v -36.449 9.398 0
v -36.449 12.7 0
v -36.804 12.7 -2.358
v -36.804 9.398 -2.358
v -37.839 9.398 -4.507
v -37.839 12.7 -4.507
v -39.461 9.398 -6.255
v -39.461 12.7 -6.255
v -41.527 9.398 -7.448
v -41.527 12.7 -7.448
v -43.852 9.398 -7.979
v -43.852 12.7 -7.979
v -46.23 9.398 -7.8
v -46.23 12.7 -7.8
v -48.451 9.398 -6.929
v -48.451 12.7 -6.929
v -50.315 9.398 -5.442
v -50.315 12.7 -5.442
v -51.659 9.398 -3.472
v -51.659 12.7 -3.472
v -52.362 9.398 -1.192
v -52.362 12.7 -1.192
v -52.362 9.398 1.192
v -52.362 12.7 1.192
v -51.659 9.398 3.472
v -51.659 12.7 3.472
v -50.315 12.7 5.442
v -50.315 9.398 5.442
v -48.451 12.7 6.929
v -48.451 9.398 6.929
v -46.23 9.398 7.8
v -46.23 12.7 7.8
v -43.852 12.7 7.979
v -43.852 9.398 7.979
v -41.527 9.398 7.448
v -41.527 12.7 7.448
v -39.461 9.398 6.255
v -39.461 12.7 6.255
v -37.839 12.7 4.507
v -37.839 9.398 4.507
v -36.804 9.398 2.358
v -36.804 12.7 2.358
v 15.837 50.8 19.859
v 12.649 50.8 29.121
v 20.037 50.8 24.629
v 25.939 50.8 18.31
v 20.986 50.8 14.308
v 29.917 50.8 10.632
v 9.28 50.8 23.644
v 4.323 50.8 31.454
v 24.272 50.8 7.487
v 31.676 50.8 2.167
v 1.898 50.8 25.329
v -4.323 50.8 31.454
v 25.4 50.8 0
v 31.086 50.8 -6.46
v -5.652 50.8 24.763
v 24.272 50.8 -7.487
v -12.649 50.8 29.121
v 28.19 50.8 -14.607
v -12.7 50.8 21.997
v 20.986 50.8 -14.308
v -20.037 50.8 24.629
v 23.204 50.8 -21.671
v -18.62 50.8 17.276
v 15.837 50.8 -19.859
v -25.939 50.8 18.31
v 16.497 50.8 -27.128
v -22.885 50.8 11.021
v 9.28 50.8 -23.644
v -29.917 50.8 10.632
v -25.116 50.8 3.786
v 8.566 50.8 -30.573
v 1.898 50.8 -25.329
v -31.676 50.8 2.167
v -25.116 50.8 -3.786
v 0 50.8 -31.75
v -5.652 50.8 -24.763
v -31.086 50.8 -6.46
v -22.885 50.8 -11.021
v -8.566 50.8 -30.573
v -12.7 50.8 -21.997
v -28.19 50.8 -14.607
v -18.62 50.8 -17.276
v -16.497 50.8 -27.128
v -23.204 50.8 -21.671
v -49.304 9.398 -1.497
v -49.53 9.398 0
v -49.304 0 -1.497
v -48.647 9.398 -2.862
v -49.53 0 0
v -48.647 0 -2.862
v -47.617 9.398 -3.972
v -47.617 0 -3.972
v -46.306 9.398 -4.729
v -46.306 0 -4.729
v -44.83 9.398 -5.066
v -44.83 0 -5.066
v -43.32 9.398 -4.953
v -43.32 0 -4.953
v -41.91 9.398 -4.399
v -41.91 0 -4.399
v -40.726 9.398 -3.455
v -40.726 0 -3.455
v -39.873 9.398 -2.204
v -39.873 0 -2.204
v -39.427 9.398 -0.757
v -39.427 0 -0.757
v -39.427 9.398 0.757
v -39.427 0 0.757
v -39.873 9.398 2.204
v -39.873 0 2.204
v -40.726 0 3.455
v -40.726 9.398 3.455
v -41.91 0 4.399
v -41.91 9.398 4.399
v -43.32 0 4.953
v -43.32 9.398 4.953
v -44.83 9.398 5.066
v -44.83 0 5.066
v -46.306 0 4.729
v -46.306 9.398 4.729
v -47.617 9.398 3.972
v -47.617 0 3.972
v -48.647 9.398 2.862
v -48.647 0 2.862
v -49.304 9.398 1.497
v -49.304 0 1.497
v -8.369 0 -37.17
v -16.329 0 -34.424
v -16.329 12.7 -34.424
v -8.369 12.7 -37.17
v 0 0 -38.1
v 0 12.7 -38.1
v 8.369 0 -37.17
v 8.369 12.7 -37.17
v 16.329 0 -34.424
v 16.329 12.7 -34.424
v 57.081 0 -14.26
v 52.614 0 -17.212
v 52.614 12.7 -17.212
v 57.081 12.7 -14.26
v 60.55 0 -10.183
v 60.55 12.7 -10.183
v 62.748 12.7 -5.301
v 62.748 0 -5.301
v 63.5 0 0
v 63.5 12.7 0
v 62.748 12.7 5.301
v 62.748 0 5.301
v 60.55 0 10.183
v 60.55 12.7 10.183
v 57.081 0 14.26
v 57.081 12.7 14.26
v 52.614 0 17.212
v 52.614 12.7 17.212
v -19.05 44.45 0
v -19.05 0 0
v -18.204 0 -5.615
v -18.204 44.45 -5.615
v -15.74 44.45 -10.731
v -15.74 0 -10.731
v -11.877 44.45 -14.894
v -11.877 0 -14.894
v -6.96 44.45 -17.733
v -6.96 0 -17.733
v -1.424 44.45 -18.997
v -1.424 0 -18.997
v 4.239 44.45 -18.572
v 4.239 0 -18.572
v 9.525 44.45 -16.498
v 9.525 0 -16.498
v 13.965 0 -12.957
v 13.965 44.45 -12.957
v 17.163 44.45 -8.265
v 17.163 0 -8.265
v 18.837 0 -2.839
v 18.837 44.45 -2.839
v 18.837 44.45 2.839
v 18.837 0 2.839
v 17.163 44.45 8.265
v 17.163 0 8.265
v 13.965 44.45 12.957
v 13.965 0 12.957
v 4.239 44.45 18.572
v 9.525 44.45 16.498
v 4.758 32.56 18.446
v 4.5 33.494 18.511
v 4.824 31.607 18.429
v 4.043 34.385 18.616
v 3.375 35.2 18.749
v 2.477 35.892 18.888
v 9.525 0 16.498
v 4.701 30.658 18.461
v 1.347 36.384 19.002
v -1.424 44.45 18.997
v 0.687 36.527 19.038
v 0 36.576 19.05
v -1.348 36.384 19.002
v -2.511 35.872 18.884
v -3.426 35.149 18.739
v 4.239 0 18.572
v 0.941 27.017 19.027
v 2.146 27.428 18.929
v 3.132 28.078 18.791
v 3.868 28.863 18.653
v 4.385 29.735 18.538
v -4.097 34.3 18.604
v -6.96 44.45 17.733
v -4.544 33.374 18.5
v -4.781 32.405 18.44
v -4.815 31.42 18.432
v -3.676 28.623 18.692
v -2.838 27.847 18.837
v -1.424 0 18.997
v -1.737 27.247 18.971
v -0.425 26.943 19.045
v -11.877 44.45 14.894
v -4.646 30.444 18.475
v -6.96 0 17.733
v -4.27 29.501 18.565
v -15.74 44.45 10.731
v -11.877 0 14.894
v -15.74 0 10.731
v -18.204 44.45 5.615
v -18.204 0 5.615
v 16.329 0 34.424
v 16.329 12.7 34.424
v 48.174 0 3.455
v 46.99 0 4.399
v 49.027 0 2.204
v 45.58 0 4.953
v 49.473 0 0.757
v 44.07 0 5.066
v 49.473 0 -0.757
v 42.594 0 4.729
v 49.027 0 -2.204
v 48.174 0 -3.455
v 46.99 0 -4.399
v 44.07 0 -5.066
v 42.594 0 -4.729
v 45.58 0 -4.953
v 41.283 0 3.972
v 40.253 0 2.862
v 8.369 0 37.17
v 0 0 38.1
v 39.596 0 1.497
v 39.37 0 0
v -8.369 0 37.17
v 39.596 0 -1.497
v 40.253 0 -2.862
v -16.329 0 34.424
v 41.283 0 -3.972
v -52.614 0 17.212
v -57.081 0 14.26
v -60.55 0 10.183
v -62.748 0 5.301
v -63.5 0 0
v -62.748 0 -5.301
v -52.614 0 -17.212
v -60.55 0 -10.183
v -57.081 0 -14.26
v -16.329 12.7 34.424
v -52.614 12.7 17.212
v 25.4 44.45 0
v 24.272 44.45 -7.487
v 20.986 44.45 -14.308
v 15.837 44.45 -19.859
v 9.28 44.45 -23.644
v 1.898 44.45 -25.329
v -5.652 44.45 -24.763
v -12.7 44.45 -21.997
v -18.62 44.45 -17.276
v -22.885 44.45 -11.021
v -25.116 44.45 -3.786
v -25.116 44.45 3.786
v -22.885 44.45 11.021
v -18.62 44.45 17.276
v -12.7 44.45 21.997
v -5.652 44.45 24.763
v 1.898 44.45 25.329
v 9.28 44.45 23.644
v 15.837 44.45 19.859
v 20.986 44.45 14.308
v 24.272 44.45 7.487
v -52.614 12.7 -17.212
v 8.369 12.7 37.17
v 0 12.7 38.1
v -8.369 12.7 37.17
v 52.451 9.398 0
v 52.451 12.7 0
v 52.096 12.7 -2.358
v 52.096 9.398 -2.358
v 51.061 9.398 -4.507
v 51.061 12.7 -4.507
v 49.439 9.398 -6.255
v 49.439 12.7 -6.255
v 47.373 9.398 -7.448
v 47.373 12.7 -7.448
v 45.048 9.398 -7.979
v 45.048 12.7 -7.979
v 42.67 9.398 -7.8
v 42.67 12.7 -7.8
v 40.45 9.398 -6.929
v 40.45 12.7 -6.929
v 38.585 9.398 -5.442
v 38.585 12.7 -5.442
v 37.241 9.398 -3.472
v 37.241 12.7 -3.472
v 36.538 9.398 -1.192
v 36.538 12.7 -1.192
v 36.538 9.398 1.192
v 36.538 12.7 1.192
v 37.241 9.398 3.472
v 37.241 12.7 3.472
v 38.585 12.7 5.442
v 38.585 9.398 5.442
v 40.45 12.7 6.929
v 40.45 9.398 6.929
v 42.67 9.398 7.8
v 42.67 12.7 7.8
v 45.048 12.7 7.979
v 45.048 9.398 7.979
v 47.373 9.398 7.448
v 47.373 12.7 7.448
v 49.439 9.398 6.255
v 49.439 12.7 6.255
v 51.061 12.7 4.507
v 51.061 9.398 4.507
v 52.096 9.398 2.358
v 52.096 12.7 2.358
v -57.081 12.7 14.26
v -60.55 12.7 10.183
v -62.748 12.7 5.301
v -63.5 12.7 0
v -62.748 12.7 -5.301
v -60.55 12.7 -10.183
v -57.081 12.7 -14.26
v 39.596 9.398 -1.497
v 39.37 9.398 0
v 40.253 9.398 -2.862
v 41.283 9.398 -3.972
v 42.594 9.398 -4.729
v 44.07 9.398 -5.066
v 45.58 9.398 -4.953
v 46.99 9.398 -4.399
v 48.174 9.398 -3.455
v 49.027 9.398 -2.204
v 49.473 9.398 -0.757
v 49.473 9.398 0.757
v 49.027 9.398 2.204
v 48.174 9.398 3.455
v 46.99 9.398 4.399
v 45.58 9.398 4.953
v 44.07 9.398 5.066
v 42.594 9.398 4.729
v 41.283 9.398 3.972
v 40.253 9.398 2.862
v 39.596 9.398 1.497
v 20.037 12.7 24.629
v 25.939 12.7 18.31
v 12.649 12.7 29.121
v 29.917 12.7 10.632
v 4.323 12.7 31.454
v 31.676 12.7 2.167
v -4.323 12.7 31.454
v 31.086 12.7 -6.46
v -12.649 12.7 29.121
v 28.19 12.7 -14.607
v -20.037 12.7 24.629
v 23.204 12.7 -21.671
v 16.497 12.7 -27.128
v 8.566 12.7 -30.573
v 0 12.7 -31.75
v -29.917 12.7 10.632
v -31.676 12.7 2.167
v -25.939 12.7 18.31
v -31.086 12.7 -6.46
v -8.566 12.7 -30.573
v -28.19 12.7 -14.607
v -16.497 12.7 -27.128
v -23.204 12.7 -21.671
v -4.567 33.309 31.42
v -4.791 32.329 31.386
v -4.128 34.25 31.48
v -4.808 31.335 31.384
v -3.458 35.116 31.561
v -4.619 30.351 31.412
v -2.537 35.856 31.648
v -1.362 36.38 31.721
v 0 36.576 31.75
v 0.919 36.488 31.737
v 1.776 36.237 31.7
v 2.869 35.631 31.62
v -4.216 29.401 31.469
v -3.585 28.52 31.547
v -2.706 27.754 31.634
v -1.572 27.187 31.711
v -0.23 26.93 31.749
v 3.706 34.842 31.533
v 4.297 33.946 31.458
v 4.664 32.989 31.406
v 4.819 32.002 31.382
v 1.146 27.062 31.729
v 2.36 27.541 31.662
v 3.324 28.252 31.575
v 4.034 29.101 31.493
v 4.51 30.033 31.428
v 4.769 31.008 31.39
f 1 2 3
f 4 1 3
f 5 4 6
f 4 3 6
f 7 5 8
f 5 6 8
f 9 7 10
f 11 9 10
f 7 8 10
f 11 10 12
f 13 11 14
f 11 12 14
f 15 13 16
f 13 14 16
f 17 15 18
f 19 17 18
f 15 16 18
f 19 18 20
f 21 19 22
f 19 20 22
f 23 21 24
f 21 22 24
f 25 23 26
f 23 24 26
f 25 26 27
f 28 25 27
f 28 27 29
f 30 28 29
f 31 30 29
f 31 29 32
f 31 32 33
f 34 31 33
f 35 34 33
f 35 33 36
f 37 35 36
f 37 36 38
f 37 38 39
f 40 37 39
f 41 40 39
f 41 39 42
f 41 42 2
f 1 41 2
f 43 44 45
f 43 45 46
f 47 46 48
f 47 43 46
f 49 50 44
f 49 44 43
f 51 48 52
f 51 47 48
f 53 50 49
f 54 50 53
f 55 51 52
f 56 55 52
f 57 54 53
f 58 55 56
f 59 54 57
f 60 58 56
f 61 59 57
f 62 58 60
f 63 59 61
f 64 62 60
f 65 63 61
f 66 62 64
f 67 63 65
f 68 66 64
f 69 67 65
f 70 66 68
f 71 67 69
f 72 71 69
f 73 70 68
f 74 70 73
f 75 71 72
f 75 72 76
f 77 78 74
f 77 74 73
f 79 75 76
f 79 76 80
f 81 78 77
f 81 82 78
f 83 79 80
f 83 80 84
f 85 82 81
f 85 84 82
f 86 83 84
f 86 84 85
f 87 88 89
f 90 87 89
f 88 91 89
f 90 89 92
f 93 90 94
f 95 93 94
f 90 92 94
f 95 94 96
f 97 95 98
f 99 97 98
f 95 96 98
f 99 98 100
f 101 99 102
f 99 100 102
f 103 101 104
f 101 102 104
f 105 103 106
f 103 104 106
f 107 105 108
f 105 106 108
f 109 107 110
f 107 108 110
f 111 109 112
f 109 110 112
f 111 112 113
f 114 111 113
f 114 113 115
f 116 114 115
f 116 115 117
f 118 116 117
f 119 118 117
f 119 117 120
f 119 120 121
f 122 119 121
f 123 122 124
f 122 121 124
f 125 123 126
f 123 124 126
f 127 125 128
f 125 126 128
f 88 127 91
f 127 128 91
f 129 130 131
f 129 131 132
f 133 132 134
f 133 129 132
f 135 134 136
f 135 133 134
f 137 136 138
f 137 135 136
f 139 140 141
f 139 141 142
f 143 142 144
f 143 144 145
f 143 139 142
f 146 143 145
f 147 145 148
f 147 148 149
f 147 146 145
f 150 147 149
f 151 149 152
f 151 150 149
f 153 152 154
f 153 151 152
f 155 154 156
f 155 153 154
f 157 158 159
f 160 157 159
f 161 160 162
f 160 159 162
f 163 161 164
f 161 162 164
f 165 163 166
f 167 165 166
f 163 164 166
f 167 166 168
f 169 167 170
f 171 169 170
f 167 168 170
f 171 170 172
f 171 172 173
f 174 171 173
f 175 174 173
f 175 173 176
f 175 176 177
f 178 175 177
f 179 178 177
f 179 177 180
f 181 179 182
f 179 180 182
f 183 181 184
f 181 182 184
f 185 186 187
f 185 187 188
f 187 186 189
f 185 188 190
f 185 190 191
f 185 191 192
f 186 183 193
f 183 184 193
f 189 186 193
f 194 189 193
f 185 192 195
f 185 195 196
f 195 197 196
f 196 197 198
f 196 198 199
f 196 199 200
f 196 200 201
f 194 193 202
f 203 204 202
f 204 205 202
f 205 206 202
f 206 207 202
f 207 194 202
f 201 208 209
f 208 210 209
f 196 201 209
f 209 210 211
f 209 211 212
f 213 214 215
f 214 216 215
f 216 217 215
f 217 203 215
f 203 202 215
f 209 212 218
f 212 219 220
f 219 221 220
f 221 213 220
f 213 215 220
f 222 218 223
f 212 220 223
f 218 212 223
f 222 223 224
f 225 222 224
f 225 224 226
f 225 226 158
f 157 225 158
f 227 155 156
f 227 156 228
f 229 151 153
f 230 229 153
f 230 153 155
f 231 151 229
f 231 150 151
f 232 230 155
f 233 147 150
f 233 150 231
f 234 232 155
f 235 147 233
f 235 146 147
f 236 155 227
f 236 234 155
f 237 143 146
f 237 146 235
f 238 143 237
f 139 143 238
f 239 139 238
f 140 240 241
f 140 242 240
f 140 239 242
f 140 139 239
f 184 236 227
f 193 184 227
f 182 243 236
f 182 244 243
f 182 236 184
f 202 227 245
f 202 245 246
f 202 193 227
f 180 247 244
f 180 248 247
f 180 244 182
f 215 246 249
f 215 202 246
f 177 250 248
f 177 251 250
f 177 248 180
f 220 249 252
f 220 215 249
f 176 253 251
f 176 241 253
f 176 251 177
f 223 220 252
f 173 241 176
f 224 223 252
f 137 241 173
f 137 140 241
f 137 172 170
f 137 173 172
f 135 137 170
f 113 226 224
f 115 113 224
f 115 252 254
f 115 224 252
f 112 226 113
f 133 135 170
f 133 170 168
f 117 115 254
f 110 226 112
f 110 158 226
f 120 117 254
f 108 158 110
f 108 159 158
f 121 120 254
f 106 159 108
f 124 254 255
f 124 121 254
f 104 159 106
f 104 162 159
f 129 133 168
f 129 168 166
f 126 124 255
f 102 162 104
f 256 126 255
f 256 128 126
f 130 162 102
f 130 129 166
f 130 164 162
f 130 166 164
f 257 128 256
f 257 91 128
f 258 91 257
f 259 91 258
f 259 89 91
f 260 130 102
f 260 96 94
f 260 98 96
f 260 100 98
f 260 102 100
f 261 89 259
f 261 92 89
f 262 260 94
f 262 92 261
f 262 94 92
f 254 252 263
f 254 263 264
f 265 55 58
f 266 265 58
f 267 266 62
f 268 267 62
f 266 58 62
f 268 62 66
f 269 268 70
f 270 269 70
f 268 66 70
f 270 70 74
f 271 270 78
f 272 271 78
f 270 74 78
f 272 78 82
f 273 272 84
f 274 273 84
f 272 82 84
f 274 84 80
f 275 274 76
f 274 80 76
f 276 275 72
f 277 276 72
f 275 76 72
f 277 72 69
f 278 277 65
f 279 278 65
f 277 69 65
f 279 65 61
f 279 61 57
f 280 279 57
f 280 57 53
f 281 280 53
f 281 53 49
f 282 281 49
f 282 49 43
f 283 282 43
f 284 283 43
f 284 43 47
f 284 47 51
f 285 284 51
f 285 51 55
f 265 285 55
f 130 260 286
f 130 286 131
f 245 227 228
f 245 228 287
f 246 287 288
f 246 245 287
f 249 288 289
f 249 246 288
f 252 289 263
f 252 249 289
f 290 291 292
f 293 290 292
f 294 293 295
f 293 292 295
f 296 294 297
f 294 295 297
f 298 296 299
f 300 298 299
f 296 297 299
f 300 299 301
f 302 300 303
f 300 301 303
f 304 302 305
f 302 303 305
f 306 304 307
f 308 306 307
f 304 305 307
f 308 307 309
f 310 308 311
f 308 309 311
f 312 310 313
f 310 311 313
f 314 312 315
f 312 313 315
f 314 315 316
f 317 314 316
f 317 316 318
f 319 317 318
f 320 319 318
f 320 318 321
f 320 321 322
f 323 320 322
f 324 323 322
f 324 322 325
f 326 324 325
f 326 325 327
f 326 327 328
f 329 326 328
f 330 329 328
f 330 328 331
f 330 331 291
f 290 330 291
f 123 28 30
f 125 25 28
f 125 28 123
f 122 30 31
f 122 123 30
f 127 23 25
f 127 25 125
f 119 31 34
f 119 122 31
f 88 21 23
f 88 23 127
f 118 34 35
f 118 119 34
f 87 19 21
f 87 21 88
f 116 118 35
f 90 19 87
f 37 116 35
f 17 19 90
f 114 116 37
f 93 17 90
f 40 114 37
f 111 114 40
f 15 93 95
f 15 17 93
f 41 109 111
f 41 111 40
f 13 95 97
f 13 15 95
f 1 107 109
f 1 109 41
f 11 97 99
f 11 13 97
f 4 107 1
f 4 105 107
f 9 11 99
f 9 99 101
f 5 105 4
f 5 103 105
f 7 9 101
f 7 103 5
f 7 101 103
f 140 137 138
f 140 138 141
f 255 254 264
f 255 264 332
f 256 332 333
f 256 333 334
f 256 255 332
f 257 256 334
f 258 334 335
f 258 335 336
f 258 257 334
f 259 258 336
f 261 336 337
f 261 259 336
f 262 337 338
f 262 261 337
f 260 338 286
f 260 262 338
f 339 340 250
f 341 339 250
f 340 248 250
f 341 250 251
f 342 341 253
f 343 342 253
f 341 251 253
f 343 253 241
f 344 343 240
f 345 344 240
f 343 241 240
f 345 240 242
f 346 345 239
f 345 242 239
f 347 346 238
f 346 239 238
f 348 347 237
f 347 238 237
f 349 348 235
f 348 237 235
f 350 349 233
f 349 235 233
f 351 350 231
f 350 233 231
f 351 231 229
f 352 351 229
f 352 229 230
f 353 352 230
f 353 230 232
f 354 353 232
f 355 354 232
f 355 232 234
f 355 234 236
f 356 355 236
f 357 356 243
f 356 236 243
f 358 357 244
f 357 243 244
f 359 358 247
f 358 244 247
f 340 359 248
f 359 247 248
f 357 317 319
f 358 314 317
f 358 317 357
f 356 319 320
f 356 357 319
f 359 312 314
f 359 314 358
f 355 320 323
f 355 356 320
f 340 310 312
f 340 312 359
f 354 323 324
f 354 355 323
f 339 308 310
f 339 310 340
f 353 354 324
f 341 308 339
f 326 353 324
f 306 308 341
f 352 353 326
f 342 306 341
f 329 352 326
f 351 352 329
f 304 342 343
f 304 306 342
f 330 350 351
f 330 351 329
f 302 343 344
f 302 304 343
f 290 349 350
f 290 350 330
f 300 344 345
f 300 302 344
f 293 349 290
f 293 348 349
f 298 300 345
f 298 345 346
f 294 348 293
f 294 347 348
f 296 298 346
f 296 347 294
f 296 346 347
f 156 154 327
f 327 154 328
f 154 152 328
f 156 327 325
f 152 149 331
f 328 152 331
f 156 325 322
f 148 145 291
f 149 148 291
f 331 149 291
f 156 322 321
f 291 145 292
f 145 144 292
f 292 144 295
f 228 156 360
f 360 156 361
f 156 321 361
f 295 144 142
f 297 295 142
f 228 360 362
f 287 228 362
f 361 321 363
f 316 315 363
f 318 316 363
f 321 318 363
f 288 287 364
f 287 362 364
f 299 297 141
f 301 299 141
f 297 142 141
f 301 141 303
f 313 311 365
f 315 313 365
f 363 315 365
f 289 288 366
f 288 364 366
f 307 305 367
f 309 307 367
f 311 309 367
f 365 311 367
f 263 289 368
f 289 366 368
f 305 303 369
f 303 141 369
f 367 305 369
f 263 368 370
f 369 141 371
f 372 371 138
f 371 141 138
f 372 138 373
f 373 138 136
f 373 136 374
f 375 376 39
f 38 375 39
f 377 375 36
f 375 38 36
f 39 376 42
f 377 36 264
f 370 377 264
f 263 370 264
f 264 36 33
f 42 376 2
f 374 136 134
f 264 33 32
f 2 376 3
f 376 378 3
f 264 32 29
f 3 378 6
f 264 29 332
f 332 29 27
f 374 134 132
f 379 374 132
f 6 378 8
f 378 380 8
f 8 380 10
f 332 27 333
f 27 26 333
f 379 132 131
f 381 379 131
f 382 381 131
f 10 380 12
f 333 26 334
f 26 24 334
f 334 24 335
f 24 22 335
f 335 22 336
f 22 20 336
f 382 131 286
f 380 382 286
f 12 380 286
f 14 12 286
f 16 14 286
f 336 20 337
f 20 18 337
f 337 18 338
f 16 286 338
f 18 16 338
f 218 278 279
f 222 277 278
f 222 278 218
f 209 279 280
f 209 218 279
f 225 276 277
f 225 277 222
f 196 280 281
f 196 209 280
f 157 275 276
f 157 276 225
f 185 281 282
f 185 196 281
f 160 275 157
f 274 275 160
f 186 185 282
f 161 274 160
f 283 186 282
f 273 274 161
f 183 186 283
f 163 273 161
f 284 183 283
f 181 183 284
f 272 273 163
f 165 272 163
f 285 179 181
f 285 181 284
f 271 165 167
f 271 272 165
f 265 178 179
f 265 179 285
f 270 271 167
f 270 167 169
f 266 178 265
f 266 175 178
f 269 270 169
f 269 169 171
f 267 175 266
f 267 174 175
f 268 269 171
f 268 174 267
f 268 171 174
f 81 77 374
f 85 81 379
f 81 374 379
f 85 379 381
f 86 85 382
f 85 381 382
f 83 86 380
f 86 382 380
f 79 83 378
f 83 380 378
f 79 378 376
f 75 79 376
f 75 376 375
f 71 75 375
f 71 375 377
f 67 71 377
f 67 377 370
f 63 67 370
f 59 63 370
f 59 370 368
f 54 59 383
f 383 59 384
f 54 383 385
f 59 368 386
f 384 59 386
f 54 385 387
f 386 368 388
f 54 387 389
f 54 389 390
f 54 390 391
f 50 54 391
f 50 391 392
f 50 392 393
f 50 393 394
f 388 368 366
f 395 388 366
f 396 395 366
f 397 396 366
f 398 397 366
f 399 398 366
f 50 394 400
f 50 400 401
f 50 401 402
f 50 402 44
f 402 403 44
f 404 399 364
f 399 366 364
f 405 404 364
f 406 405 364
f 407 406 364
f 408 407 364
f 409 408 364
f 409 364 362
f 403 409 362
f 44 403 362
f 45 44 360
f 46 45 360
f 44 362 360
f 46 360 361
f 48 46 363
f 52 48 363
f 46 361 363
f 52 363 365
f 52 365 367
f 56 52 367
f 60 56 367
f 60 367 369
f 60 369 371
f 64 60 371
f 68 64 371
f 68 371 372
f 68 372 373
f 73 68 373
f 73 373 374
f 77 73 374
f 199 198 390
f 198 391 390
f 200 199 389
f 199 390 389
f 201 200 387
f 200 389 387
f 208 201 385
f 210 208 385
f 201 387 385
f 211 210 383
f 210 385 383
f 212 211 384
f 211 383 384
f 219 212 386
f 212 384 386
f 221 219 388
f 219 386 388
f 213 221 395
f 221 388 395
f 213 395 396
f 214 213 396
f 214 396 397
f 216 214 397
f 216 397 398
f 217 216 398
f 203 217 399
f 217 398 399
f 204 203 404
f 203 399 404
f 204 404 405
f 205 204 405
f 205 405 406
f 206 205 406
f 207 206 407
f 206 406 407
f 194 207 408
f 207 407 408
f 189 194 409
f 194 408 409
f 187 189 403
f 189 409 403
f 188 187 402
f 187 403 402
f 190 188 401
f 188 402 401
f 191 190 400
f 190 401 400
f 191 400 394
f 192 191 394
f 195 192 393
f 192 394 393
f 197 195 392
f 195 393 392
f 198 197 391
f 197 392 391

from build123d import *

# Parameters (mm, degrees)
BOSS_EXTRUDE1_DEPTH                                  = 12.7
SKETCH2_R                                            = 31.75
BOSS_EXTRUDE2_DEPTH                                  = 38.1
CBORE_FOR_3_8_BINDING_HEAD_MACHINE_SCREW_D           = 38.1
CBORE_FOR_3_8_BINDING_HEAD_MACHINE_SCREW_CBORE_D     = 50.8
CBORE_FOR_3_8_BINDING_HEAD_MACHINE_SCREW_CBORE_DEPTH = 6.35
CBORE_FOR_3_8_BINDING_HEAD_MACHINE_S_2_D             = 10.16
CBORE_FOR_3_8_BINDING_HEAD_MACHINE_S_2_CBORE_D       = 16.002
CBORE_FOR_3_8_BINDING_HEAD_MACHINE_S_2_CBORE_DEPTH   = 3.302
SKETCH9_W                                            = 4.826
SKETCH9_H                                            = 38.1


with BuildPart() as part:
    # Sketch1 → Boss-Extrude1 (new body)
    with BuildSketch(Plane(origin=(0, 0, 0), x_dir=(1, 0, 0), z_dir=(0, 1, 0))):
        with BuildLine():
            Line((-52.614285714, 17.21182555), (-16.328571429, 34.423651101))
            ThreePointArc((-16.328571429, 34.423651101), (0, 38.1), (16.328571429, 34.423651101))
            Line((16.328571429, 34.423651101), (52.614285714, 17.21182555))
            ThreePointArc((52.614285714, 17.21182555), (63.5, 0), (52.614285714, -17.21182555))
            Line((52.614285714, -17.21182555), (16.328571429, -34.423651101))
            ThreePointArc((16.328571429, -34.423651101), (0, -38.1), (-16.328571429, -34.423651101))
            Line((-16.328571429, -34.423651101), (-52.614285714, -17.21182555))
            ThreePointArc((-52.614285714, -17.21182555), (-63.5, 0), (-52.614285714, 17.21182555))
        make_face()
    extrude(amount=BOSS_EXTRUDE1_DEPTH)

    # Sketch2 → Boss-Extrude2 (add)
    with BuildSketch(Plane(origin=(0, 12.7, 0), x_dir=(1, 0, 0), z_dir=(0, 1, 0))):
        with Locations(Location((0, 0, 0), (0, 0, 90))):
            Circle(SKETCH2_R)
    extrude(amount=BOSS_EXTRUDE2_DEPTH)

    # CBORE for 3_8 Binding Head Machine Screw (through all)
    with Locations(Plane(origin=(0, 50.8, 0), x_dir=(1, 0, 0), z_dir=(0, 1, 0))):
        with Locations((0, 0)):
            CounterBoreHole(CBORE_FOR_3_8_BINDING_HEAD_MACHINE_SCREW_D / 2, CBORE_FOR_3_8_BINDING_HEAD_MACHINE_SCREW_CBORE_D / 2, CBORE_FOR_3_8_BINDING_HEAD_MACHINE_SCREW_CBORE_DEPTH)

    # CBORE for 3_8 Binding Head Machine S 2 (through all)
    with Locations(Plane(origin=(0, 12.7, 0), x_dir=(1, 0, 0), z_dir=(0, 1, 0))):
        with Locations((-44.45, 0), (44.45, 0)):
            CounterBoreHole(CBORE_FOR_3_8_BINDING_HEAD_MACHINE_S_2_D / 2, CBORE_FOR_3_8_BINDING_HEAD_MACHINE_S_2_CBORE_D / 2, CBORE_FOR_3_8_BINDING_HEAD_MACHINE_S_2_CBORE_DEPTH)

    # Sketch9 → 3/8 (0.38) Diameter Hole1 (revolve, cut)
    with BuildSketch(Plane(origin=(0, 31.75, 0), x_dir=(0, 1, 0), z_dir=(1, 0, 0))):
        with Locations((2.413, 19.05)):
            Rectangle(SKETCH9_W, SKETCH9_H)
    revolve(axis=Axis((0, 31.75, -6.35), (0, 0, 1)), mode=Mode.SUBTRACT)


solid = part.part
